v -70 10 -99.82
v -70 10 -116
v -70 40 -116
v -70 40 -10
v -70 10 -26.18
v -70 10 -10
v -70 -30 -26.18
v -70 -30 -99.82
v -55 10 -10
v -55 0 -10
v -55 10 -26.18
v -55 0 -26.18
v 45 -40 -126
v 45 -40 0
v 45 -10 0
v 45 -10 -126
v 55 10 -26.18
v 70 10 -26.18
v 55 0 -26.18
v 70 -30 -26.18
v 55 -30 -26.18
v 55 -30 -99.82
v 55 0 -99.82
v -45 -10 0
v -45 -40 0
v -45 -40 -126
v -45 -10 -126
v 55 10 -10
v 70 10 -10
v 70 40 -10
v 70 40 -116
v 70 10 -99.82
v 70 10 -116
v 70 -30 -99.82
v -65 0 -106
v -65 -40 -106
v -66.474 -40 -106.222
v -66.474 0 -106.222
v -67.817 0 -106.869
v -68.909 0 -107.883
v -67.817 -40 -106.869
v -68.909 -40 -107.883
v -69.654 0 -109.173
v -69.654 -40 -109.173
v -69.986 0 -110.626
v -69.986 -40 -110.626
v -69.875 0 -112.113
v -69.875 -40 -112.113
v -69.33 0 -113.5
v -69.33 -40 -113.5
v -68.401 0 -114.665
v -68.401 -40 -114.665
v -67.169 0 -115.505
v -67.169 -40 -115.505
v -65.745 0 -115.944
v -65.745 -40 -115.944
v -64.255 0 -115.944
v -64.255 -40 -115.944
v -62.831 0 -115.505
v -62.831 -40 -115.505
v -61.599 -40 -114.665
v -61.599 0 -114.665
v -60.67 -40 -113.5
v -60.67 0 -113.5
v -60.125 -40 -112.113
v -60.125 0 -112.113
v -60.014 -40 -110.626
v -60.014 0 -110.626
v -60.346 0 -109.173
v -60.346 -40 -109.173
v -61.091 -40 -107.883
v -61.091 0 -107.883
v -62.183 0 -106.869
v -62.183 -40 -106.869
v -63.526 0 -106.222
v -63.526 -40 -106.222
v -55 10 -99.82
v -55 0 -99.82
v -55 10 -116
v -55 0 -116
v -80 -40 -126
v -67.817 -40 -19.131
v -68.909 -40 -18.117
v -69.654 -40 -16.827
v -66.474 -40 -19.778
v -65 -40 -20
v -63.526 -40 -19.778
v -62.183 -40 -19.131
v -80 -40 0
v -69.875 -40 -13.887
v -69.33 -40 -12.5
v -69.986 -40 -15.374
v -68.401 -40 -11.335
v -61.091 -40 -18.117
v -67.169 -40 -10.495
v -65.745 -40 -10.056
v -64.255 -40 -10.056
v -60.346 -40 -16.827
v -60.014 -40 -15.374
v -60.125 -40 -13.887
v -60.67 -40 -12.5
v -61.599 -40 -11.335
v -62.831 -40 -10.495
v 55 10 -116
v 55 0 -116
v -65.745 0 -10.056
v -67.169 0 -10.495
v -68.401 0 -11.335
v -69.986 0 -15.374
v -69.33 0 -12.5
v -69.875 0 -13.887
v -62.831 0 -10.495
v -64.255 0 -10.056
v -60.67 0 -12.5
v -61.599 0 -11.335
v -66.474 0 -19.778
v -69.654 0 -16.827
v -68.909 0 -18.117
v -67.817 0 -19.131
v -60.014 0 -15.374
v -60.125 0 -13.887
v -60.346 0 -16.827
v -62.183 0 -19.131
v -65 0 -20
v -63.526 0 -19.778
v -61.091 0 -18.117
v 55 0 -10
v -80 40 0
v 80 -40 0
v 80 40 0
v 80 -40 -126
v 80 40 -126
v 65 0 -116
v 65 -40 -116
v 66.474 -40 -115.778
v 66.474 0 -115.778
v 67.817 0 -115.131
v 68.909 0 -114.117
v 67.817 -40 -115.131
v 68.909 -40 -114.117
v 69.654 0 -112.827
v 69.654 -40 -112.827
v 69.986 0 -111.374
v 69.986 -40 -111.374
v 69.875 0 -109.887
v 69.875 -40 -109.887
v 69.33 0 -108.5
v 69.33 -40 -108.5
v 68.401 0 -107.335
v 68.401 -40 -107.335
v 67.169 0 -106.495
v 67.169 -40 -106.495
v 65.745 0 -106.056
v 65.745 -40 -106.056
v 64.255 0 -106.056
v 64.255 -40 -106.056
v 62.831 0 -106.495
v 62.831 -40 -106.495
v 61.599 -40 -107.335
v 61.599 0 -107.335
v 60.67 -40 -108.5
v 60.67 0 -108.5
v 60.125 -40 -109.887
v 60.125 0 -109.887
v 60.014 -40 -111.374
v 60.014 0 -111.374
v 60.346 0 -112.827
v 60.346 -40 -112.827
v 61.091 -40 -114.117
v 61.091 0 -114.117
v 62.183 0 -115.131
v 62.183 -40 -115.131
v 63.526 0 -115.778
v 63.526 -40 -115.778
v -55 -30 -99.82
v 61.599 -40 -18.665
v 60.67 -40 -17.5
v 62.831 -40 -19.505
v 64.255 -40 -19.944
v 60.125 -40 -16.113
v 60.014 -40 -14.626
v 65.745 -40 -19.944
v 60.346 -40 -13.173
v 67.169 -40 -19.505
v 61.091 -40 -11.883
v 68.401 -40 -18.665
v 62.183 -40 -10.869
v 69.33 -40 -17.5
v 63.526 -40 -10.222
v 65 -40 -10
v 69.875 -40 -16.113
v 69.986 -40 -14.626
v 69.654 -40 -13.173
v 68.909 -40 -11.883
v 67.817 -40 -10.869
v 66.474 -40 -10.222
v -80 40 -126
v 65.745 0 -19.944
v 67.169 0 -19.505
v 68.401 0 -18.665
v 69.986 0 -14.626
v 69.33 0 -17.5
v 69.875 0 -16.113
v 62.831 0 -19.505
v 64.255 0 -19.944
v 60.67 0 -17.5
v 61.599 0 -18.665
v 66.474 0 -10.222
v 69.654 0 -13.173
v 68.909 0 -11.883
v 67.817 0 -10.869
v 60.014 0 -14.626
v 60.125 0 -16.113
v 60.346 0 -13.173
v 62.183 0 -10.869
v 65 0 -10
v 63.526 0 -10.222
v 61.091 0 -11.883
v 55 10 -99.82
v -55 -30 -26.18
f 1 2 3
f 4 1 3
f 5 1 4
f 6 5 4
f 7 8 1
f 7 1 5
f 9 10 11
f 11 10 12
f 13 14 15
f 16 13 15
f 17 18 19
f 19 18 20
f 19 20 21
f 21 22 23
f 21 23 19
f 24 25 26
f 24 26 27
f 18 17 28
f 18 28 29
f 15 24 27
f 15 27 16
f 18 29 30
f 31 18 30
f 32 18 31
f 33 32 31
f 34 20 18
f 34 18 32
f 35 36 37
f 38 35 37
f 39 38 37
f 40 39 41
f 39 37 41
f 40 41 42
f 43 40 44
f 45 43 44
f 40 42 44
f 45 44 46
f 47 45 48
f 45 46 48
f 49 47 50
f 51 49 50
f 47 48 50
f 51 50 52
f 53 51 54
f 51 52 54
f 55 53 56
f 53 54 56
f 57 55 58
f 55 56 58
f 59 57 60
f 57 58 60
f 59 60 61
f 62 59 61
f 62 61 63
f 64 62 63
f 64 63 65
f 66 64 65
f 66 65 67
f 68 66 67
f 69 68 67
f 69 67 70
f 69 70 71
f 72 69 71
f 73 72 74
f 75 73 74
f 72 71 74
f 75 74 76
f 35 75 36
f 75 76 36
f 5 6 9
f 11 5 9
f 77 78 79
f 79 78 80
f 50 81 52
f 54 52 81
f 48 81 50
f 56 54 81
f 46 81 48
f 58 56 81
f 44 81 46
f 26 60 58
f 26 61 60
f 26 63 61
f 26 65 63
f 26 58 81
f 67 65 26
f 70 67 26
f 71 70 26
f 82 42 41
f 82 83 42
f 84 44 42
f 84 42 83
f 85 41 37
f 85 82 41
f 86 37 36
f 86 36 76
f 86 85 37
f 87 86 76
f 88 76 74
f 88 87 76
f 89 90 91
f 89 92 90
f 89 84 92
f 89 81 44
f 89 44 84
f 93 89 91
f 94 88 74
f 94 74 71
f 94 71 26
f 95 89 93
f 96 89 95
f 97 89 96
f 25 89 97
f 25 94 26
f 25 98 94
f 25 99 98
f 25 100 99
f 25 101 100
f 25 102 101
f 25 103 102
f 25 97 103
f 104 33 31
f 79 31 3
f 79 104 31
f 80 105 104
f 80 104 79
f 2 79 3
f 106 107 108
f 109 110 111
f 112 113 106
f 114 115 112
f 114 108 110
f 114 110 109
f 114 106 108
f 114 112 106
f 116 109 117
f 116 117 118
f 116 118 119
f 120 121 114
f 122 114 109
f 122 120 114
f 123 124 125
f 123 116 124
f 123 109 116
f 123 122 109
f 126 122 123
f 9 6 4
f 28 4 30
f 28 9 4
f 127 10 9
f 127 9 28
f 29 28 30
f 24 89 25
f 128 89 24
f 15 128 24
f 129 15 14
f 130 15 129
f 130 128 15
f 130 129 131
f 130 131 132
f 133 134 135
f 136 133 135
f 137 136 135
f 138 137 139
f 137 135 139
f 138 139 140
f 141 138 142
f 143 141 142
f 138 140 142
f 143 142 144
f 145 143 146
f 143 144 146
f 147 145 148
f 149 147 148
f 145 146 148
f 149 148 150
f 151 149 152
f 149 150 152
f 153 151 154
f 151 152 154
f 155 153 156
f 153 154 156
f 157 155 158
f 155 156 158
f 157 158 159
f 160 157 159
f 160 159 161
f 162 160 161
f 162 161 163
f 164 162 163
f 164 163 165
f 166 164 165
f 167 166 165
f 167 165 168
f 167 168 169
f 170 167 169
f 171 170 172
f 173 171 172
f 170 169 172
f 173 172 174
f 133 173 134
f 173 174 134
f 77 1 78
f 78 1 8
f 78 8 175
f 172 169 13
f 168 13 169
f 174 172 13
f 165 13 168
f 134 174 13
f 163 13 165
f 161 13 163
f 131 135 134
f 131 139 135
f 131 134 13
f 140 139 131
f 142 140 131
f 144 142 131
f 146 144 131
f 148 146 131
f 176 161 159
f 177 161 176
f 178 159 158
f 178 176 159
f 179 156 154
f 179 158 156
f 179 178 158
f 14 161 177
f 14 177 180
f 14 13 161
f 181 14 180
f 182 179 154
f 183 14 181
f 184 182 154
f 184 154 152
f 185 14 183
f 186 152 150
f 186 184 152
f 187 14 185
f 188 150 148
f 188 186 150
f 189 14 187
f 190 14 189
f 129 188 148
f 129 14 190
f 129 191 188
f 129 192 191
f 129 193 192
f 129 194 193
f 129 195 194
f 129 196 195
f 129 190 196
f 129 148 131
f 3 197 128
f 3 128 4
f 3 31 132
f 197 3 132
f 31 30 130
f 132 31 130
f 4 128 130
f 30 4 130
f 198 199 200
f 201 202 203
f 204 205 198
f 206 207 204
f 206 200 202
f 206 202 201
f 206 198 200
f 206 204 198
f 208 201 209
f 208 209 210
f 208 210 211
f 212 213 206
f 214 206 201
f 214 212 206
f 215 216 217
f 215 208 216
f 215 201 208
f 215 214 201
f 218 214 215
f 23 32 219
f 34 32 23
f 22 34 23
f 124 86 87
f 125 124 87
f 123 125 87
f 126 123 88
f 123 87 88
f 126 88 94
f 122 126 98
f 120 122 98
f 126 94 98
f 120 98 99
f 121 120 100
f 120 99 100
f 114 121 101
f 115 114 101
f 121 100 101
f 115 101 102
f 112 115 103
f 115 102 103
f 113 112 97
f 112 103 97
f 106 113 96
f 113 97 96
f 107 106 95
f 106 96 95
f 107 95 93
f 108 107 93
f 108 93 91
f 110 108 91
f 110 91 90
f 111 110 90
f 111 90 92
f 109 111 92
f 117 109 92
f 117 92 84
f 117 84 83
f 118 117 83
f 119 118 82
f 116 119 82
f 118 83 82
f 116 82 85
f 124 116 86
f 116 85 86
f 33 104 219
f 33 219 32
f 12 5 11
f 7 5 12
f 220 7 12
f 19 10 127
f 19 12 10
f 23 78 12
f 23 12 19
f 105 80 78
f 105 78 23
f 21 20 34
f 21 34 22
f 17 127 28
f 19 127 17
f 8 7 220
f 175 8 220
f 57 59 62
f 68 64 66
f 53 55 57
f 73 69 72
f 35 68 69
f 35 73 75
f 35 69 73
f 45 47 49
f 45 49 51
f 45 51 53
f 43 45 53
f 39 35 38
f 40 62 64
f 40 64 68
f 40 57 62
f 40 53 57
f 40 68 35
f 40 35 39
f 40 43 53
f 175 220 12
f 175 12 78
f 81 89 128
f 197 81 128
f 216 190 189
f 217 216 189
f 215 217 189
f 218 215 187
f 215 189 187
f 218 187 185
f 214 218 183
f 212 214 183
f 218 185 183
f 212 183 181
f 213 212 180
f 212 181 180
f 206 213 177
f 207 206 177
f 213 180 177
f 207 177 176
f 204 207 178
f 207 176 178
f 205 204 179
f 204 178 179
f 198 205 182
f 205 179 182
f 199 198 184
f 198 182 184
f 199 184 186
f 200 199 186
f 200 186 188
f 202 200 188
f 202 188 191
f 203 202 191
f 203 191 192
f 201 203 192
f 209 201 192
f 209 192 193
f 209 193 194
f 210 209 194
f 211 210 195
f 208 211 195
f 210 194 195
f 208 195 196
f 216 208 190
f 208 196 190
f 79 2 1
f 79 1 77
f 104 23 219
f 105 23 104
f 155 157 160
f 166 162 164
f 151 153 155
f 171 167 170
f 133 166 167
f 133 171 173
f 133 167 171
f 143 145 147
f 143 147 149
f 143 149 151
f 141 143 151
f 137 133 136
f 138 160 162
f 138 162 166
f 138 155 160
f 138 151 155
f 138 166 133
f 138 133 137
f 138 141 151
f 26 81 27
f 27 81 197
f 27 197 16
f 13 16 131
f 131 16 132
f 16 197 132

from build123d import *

# Parameters (mm, degrees)
SKETCH1_W           = 160
SKETCH1_H           = 80
BOSS_EXTRUDE1_DEPTH = 126
SKETCH2_W           = 90
SKETCH2_H           = 60
CUT_EXTRUDE1_DEPTH  = 126
SKETCH3_R           = 5
CUT_EXTRUDE2_DEPTH  = 40
SHELL1_DEPTH        = 40
SHELL1_START        = -30
SHELL1_2_DEPTH      = 30
SHELL1_START_2      = 10
SHELL1_3_DEPTH      = 30
SKETCH4_W           = 110
SKETCH4_H           = 106
CUT_EXTRUDE3_DEPTH  = 10
SKETCH5_W           = 15
SKETCH5_H           = 73.639320226
CUT_EXTRUDE4_DEPTH  = 40


# Read off the part's stored shape, not the designer's step: Shell1
with BuildPart() as part:
    # Sketch1 → Boss-Extrude1 (new body)
    with BuildSketch(Plane.XY):
        Rectangle(SKETCH1_W, SKETCH1_H)
    extrude(amount=-BOSS_EXTRUDE1_DEPTH)

    # Sketch2 → Cut-Extrude1 (cut)
    with BuildSketch(Plane.XY):
        with Locations((0, -40)):
            Rectangle(SKETCH2_W, SKETCH2_H)
    extrude(amount=-CUT_EXTRUDE1_DEPTH, mode=Mode.SUBTRACT)

    # Sketch3 → Cut-Extrude2 (cut)
    with BuildSketch(Plane.XZ.offset(40)):
        with Locations(Location((-65, -15, 0), (0, 0, 270))):
            Circle(SKETCH3_R)
        with Locations(Location((65, -15, 0), (0, 0, 90))):
            Circle(SKETCH3_R)
        with Locations(Location((65, -111, 0), (0, 0, 270))):
            Circle(SKETCH3_R)
        with Locations(Location((-65, -111, 0), (0, 0, 90))):
            Circle(SKETCH3_R)
    extrude(amount=-CUT_EXTRUDE2_DEPTH, mode=Mode.SUBTRACT)

    # Shell1 outline → Shell1 (cut)
    with BuildSketch(Plane(origin=(0, 0, 0), x_dir=(1, 0, 0), z_dir=(0, 1, 0))):
        with BuildLine():
            Line((70, 29.142135624), (70, 96.857864376))
            ThreePointArc((70, 96.857864376), (54.393398282, 100.393398282), (50.857864376, 116))
            Line((50.857864376, 116), (-50.857864376, 116))
            ThreePointArc((-50.857864376, 116), (-54.393398282, 100.393398282), (-70, 96.857864376))
            Line((-70, 96.857864376), (-70, 29.142135624))
            ThreePointArc((-70, 29.142135624), (-54.393398282, 25.606601718), (-50.857864376, 10))
            Line((-50.857864376, 10), (50.857864376, 10))
            ThreePointArc((50.857864376, 10), (54.393398282, 25.606601718), (70, 29.142135624))
        make_face()
    extrude(amount=SHELL1_DEPTH, mode=Mode.SUBTRACT)

    # Shell1 2 outline → Shell1 2 (cut)
    with BuildSketch(Plane(origin=(0, 0, 0), x_dir=(1, 0, 0), z_dir=(0, 1, 0)).offset(SHELL1_START)):
        with BuildLine():
            ThreePointArc((55, 26.180339887), (62.094305849, 29.715873794), (70, 29.142135624))
            Line((70, 29.142135624), (70, 96.857864376))
            ThreePointArc((70, 96.857864376), (62.094305849, 96.284126206), (55, 99.819660113))
            Line((55, 99.819660113), (55, 26.180339887))
        make_face()
        with BuildLine():
            ThreePointArc((-70, 29.142135624), (-62.094305849, 29.715873794), (-55, 26.180339887))
            Line((-55, 26.180339887), (-55, 99.819660113))
            ThreePointArc((-55, 99.819660113), (-62.094305849, 96.284126206), (-70, 96.857864376))
            Line((-70, 96.857864376), (-70, 29.142135624))
        make_face()
    extrude(amount=SHELL1_2_DEPTH, mode=Mode.SUBTRACT)

    # Shell1 3 outline → Shell1 3 (cut)
    with BuildSketch(Plane(origin=(0, 0, 0), x_dir=(1, 0, 0), z_dir=(0, 1, 0)).offset(SHELL1_START_2)):
        with BuildLine():
            Line((50.857864376, 10), (70, 10))
            Line((70, 10), (70, 29.142135624))
            ThreePointArc((70, 29.142135624), (54.393398282, 25.606601718), (50.857864376, 10))
        make_face()
        with BuildLine():
            ThreePointArc((50.857864376, 116), (54.393398282, 100.393398282), (70, 96.857864376))
            Line((70, 96.857864376), (70, 116))
            Line((70, 116), (50.857864376, 116))
        make_face()
        with BuildLine():
            Line((-70, 10), (-50.857864376, 10))
            ThreePointArc((-50.857864376, 10), (-54.393398282, 25.606601718), (-70, 29.142135624))
            Line((-70, 29.142135624), (-70, 10))
        make_face()
        with BuildLine():
            ThreePointArc((-70, 96.857864376), (-54.393398282, 100.393398282), (-50.857864376, 116))
            Line((-50.857864376, 116), (-70, 116))
            Line((-70, 116), (-70, 96.857864376))
        make_face()
    extrude(amount=SHELL1_3_DEPTH, mode=Mode.SUBTRACT)

    # Sketch4 → Cut-Extrude3 (cut)
    with BuildSketch(Plane(origin=(0, 0, 0), x_dir=(1, 0, 0), z_dir=(0, 1, 0))):
        with Locations((0, 63)):
            Rectangle(SKETCH4_W, SKETCH4_H)
    extrude(amount=CUT_EXTRUDE3_DEPTH, mode=Mode.SUBTRACT)

    # Sketch5 → Cut-Extrude4 (cut)
    with BuildSketch(Plane(origin=(0, -30, 0), x_dir=(1, 0, 0), z_dir=(0, 1, 0))):
        with Locations((-62.5, 63)):
            Rectangle(SKETCH5_W, SKETCH5_H)
    cut_extrude4 = extrude(amount=CUT_EXTRUDE4_DEPTH, mode=Mode.SUBTRACT)

    # Mirror1: Cut-Extrude4 across plane
    add(cut_extrude4.mirror(Plane(origin=(0, 0, 0), x_dir=(0, 0, 1), z_dir=(1, 0, 0))), mode=Mode.SUBTRACT)


solid = part.part
